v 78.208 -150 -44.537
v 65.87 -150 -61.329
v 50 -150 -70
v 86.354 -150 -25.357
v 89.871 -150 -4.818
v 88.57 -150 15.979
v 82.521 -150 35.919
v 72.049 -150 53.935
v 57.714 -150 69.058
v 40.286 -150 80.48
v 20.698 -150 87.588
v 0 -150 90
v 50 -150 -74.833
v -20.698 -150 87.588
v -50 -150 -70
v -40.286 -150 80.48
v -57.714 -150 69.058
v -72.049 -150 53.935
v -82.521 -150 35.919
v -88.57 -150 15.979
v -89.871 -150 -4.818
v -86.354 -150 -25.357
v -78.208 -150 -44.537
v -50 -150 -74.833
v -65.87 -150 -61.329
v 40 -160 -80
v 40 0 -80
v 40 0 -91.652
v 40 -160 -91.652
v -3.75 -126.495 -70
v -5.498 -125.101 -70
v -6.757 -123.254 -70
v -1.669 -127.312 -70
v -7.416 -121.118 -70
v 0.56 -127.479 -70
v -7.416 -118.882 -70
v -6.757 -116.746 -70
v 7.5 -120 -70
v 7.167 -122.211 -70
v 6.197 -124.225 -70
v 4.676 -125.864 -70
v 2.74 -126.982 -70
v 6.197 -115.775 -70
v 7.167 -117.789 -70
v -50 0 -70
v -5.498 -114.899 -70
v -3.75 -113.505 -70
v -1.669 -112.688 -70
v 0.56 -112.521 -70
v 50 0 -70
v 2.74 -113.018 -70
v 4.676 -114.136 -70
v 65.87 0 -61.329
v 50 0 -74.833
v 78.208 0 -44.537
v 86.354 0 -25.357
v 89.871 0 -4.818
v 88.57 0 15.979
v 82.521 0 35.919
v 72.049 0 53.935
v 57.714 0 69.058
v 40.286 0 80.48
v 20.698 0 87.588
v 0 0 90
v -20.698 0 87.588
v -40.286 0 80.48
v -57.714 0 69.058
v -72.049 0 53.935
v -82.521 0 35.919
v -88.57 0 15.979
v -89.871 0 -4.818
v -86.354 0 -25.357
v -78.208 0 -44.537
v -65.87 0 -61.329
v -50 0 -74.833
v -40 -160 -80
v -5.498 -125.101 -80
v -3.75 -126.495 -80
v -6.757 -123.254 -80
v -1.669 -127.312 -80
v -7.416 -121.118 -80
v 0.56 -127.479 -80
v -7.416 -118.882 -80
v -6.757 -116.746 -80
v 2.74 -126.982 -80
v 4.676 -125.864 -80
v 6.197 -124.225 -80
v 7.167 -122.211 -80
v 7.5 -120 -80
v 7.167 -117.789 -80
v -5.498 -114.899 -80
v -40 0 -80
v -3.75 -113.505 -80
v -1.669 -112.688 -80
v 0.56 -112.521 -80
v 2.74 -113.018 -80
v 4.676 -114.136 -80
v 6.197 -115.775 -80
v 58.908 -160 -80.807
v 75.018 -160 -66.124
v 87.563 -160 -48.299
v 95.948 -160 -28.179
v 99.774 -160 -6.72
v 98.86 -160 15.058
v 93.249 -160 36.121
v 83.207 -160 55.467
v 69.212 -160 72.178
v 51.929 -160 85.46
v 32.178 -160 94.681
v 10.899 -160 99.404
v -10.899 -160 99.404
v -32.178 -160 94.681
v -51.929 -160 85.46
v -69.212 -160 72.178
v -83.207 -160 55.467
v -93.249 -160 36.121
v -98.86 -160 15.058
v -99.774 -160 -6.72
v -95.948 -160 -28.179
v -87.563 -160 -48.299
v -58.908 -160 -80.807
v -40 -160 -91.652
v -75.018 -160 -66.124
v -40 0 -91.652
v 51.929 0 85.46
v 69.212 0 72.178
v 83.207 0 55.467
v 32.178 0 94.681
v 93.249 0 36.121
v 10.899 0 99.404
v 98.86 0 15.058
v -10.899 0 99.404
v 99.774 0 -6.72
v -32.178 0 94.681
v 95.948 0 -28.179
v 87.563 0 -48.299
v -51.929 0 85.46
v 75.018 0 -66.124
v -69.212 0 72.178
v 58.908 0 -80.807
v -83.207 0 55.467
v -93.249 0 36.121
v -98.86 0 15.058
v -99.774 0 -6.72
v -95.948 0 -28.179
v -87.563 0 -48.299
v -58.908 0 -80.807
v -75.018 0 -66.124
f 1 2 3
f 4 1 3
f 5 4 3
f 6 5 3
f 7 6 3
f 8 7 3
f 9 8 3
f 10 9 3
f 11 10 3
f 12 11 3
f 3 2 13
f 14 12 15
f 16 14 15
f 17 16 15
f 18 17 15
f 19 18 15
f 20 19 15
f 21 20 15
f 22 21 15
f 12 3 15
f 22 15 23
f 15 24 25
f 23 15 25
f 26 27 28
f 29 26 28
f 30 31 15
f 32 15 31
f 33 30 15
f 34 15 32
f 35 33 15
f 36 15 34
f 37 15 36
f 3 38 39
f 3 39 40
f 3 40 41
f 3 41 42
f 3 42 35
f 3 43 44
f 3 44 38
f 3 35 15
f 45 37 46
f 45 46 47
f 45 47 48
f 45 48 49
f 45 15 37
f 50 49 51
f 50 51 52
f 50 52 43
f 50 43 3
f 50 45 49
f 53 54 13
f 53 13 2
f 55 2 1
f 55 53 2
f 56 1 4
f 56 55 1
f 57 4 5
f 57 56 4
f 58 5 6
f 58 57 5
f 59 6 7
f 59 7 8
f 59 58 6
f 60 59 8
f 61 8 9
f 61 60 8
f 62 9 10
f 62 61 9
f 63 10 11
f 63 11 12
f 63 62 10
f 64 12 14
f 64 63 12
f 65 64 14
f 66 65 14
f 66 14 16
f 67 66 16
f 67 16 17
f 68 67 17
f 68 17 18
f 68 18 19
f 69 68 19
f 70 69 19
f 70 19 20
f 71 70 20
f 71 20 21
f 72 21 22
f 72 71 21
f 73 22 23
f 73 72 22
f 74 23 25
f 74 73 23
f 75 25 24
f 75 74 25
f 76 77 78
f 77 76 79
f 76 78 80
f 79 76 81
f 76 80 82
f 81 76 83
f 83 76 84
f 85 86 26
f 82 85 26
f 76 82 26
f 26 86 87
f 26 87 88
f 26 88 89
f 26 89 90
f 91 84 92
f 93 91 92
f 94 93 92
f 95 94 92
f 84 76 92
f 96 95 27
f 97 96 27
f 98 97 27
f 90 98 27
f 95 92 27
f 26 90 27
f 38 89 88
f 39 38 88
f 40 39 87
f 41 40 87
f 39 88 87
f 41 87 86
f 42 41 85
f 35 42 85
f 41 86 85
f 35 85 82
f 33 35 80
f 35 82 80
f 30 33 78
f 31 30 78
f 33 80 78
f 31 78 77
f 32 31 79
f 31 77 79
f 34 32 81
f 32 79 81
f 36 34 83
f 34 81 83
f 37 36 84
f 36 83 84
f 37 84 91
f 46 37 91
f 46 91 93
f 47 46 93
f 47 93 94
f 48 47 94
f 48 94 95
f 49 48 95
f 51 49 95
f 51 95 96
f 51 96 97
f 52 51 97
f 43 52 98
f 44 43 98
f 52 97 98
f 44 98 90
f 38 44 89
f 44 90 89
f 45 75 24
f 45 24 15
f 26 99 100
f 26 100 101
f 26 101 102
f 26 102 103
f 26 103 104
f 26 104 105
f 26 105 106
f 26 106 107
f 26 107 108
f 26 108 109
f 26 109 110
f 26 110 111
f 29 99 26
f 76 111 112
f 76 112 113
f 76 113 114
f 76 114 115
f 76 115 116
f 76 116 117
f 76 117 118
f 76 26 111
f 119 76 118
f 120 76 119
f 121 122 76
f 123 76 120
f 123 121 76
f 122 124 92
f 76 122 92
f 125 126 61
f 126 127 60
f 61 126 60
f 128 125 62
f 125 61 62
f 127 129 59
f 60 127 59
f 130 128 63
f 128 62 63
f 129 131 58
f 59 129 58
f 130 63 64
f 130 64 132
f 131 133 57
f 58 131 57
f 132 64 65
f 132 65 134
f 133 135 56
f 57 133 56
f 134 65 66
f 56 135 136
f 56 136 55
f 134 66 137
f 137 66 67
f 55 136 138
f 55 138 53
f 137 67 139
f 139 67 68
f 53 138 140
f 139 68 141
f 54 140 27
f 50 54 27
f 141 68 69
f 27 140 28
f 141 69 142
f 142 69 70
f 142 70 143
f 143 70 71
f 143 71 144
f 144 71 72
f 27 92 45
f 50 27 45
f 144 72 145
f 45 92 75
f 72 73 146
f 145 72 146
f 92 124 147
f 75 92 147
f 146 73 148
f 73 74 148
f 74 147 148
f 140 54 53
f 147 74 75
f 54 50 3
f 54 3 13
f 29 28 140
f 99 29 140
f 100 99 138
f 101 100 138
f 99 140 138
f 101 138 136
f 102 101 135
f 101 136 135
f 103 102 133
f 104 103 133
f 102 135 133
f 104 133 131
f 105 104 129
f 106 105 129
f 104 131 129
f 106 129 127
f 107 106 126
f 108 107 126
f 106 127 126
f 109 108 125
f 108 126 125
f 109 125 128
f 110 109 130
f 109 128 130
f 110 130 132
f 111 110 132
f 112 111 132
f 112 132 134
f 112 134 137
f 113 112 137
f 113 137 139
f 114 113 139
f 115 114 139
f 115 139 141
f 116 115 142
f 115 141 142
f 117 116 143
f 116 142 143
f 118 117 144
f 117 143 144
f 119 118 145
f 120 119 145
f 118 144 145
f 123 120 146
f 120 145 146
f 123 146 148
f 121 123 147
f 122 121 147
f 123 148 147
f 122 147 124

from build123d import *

# Parameters (mm, degrees)
BOSS_EXTRUDE2_DEPTH = 160
CUT_EXTRUDE1_DEPTH  = 150
SKETCH3_R           = 7.5
CUT_EXTRUDE2_DEPTH  = 10


with BuildPart() as part:
    # Sketch1 → Boss-Extrude2 (new body)
    with BuildSketch(Plane(origin=(0, 0, 0), x_dir=(1, 0, 0), z_dir=(0, 1, 0))):
        with BuildLine():
            Line((-40, 80), (40, 80))
            Line((40, 80), (40, 91.651513899))
            ThreePointArc((40, 91.651513899), (0, -100), (-40, 91.651513899))
            Line((-40, 91.651513899), (-40, 80))
        make_face()
    extrude(amount=-BOSS_EXTRUDE2_DEPTH)

    # Sketch2 → Cut-Extrude1 (cut)
    with BuildSketch(Plane(origin=(0, 0, 0), x_dir=(1, 0, 0), z_dir=(0, 1, 0))):
        with BuildLine():
            Line((-50, 74.833147735), (-50, 70))
            Line((-50, 70), (50, 70))
            Line((50, 70), (50, 74.833147735))
            ThreePointArc((50, 74.833147735), (0, -90), (-50, 74.833147735))
        make_face()
    extrude(amount=-CUT_EXTRUDE1_DEPTH, mode=Mode.SUBTRACT)

    # Sketch3 → Cut-Extrude2 (cut)
    with BuildSketch(Plane(origin=(0, 0, -80), x_dir=(-1, 0, 0), z_dir=(0, 0, -1))):
        with Locations(Location((0, -120, 0), (0, 0, 180))):
            Circle(SKETCH3_R)
    extrude(amount=-CUT_EXTRUDE2_DEPTH, mode=Mode.SUBTRACT)


solid = part.part
